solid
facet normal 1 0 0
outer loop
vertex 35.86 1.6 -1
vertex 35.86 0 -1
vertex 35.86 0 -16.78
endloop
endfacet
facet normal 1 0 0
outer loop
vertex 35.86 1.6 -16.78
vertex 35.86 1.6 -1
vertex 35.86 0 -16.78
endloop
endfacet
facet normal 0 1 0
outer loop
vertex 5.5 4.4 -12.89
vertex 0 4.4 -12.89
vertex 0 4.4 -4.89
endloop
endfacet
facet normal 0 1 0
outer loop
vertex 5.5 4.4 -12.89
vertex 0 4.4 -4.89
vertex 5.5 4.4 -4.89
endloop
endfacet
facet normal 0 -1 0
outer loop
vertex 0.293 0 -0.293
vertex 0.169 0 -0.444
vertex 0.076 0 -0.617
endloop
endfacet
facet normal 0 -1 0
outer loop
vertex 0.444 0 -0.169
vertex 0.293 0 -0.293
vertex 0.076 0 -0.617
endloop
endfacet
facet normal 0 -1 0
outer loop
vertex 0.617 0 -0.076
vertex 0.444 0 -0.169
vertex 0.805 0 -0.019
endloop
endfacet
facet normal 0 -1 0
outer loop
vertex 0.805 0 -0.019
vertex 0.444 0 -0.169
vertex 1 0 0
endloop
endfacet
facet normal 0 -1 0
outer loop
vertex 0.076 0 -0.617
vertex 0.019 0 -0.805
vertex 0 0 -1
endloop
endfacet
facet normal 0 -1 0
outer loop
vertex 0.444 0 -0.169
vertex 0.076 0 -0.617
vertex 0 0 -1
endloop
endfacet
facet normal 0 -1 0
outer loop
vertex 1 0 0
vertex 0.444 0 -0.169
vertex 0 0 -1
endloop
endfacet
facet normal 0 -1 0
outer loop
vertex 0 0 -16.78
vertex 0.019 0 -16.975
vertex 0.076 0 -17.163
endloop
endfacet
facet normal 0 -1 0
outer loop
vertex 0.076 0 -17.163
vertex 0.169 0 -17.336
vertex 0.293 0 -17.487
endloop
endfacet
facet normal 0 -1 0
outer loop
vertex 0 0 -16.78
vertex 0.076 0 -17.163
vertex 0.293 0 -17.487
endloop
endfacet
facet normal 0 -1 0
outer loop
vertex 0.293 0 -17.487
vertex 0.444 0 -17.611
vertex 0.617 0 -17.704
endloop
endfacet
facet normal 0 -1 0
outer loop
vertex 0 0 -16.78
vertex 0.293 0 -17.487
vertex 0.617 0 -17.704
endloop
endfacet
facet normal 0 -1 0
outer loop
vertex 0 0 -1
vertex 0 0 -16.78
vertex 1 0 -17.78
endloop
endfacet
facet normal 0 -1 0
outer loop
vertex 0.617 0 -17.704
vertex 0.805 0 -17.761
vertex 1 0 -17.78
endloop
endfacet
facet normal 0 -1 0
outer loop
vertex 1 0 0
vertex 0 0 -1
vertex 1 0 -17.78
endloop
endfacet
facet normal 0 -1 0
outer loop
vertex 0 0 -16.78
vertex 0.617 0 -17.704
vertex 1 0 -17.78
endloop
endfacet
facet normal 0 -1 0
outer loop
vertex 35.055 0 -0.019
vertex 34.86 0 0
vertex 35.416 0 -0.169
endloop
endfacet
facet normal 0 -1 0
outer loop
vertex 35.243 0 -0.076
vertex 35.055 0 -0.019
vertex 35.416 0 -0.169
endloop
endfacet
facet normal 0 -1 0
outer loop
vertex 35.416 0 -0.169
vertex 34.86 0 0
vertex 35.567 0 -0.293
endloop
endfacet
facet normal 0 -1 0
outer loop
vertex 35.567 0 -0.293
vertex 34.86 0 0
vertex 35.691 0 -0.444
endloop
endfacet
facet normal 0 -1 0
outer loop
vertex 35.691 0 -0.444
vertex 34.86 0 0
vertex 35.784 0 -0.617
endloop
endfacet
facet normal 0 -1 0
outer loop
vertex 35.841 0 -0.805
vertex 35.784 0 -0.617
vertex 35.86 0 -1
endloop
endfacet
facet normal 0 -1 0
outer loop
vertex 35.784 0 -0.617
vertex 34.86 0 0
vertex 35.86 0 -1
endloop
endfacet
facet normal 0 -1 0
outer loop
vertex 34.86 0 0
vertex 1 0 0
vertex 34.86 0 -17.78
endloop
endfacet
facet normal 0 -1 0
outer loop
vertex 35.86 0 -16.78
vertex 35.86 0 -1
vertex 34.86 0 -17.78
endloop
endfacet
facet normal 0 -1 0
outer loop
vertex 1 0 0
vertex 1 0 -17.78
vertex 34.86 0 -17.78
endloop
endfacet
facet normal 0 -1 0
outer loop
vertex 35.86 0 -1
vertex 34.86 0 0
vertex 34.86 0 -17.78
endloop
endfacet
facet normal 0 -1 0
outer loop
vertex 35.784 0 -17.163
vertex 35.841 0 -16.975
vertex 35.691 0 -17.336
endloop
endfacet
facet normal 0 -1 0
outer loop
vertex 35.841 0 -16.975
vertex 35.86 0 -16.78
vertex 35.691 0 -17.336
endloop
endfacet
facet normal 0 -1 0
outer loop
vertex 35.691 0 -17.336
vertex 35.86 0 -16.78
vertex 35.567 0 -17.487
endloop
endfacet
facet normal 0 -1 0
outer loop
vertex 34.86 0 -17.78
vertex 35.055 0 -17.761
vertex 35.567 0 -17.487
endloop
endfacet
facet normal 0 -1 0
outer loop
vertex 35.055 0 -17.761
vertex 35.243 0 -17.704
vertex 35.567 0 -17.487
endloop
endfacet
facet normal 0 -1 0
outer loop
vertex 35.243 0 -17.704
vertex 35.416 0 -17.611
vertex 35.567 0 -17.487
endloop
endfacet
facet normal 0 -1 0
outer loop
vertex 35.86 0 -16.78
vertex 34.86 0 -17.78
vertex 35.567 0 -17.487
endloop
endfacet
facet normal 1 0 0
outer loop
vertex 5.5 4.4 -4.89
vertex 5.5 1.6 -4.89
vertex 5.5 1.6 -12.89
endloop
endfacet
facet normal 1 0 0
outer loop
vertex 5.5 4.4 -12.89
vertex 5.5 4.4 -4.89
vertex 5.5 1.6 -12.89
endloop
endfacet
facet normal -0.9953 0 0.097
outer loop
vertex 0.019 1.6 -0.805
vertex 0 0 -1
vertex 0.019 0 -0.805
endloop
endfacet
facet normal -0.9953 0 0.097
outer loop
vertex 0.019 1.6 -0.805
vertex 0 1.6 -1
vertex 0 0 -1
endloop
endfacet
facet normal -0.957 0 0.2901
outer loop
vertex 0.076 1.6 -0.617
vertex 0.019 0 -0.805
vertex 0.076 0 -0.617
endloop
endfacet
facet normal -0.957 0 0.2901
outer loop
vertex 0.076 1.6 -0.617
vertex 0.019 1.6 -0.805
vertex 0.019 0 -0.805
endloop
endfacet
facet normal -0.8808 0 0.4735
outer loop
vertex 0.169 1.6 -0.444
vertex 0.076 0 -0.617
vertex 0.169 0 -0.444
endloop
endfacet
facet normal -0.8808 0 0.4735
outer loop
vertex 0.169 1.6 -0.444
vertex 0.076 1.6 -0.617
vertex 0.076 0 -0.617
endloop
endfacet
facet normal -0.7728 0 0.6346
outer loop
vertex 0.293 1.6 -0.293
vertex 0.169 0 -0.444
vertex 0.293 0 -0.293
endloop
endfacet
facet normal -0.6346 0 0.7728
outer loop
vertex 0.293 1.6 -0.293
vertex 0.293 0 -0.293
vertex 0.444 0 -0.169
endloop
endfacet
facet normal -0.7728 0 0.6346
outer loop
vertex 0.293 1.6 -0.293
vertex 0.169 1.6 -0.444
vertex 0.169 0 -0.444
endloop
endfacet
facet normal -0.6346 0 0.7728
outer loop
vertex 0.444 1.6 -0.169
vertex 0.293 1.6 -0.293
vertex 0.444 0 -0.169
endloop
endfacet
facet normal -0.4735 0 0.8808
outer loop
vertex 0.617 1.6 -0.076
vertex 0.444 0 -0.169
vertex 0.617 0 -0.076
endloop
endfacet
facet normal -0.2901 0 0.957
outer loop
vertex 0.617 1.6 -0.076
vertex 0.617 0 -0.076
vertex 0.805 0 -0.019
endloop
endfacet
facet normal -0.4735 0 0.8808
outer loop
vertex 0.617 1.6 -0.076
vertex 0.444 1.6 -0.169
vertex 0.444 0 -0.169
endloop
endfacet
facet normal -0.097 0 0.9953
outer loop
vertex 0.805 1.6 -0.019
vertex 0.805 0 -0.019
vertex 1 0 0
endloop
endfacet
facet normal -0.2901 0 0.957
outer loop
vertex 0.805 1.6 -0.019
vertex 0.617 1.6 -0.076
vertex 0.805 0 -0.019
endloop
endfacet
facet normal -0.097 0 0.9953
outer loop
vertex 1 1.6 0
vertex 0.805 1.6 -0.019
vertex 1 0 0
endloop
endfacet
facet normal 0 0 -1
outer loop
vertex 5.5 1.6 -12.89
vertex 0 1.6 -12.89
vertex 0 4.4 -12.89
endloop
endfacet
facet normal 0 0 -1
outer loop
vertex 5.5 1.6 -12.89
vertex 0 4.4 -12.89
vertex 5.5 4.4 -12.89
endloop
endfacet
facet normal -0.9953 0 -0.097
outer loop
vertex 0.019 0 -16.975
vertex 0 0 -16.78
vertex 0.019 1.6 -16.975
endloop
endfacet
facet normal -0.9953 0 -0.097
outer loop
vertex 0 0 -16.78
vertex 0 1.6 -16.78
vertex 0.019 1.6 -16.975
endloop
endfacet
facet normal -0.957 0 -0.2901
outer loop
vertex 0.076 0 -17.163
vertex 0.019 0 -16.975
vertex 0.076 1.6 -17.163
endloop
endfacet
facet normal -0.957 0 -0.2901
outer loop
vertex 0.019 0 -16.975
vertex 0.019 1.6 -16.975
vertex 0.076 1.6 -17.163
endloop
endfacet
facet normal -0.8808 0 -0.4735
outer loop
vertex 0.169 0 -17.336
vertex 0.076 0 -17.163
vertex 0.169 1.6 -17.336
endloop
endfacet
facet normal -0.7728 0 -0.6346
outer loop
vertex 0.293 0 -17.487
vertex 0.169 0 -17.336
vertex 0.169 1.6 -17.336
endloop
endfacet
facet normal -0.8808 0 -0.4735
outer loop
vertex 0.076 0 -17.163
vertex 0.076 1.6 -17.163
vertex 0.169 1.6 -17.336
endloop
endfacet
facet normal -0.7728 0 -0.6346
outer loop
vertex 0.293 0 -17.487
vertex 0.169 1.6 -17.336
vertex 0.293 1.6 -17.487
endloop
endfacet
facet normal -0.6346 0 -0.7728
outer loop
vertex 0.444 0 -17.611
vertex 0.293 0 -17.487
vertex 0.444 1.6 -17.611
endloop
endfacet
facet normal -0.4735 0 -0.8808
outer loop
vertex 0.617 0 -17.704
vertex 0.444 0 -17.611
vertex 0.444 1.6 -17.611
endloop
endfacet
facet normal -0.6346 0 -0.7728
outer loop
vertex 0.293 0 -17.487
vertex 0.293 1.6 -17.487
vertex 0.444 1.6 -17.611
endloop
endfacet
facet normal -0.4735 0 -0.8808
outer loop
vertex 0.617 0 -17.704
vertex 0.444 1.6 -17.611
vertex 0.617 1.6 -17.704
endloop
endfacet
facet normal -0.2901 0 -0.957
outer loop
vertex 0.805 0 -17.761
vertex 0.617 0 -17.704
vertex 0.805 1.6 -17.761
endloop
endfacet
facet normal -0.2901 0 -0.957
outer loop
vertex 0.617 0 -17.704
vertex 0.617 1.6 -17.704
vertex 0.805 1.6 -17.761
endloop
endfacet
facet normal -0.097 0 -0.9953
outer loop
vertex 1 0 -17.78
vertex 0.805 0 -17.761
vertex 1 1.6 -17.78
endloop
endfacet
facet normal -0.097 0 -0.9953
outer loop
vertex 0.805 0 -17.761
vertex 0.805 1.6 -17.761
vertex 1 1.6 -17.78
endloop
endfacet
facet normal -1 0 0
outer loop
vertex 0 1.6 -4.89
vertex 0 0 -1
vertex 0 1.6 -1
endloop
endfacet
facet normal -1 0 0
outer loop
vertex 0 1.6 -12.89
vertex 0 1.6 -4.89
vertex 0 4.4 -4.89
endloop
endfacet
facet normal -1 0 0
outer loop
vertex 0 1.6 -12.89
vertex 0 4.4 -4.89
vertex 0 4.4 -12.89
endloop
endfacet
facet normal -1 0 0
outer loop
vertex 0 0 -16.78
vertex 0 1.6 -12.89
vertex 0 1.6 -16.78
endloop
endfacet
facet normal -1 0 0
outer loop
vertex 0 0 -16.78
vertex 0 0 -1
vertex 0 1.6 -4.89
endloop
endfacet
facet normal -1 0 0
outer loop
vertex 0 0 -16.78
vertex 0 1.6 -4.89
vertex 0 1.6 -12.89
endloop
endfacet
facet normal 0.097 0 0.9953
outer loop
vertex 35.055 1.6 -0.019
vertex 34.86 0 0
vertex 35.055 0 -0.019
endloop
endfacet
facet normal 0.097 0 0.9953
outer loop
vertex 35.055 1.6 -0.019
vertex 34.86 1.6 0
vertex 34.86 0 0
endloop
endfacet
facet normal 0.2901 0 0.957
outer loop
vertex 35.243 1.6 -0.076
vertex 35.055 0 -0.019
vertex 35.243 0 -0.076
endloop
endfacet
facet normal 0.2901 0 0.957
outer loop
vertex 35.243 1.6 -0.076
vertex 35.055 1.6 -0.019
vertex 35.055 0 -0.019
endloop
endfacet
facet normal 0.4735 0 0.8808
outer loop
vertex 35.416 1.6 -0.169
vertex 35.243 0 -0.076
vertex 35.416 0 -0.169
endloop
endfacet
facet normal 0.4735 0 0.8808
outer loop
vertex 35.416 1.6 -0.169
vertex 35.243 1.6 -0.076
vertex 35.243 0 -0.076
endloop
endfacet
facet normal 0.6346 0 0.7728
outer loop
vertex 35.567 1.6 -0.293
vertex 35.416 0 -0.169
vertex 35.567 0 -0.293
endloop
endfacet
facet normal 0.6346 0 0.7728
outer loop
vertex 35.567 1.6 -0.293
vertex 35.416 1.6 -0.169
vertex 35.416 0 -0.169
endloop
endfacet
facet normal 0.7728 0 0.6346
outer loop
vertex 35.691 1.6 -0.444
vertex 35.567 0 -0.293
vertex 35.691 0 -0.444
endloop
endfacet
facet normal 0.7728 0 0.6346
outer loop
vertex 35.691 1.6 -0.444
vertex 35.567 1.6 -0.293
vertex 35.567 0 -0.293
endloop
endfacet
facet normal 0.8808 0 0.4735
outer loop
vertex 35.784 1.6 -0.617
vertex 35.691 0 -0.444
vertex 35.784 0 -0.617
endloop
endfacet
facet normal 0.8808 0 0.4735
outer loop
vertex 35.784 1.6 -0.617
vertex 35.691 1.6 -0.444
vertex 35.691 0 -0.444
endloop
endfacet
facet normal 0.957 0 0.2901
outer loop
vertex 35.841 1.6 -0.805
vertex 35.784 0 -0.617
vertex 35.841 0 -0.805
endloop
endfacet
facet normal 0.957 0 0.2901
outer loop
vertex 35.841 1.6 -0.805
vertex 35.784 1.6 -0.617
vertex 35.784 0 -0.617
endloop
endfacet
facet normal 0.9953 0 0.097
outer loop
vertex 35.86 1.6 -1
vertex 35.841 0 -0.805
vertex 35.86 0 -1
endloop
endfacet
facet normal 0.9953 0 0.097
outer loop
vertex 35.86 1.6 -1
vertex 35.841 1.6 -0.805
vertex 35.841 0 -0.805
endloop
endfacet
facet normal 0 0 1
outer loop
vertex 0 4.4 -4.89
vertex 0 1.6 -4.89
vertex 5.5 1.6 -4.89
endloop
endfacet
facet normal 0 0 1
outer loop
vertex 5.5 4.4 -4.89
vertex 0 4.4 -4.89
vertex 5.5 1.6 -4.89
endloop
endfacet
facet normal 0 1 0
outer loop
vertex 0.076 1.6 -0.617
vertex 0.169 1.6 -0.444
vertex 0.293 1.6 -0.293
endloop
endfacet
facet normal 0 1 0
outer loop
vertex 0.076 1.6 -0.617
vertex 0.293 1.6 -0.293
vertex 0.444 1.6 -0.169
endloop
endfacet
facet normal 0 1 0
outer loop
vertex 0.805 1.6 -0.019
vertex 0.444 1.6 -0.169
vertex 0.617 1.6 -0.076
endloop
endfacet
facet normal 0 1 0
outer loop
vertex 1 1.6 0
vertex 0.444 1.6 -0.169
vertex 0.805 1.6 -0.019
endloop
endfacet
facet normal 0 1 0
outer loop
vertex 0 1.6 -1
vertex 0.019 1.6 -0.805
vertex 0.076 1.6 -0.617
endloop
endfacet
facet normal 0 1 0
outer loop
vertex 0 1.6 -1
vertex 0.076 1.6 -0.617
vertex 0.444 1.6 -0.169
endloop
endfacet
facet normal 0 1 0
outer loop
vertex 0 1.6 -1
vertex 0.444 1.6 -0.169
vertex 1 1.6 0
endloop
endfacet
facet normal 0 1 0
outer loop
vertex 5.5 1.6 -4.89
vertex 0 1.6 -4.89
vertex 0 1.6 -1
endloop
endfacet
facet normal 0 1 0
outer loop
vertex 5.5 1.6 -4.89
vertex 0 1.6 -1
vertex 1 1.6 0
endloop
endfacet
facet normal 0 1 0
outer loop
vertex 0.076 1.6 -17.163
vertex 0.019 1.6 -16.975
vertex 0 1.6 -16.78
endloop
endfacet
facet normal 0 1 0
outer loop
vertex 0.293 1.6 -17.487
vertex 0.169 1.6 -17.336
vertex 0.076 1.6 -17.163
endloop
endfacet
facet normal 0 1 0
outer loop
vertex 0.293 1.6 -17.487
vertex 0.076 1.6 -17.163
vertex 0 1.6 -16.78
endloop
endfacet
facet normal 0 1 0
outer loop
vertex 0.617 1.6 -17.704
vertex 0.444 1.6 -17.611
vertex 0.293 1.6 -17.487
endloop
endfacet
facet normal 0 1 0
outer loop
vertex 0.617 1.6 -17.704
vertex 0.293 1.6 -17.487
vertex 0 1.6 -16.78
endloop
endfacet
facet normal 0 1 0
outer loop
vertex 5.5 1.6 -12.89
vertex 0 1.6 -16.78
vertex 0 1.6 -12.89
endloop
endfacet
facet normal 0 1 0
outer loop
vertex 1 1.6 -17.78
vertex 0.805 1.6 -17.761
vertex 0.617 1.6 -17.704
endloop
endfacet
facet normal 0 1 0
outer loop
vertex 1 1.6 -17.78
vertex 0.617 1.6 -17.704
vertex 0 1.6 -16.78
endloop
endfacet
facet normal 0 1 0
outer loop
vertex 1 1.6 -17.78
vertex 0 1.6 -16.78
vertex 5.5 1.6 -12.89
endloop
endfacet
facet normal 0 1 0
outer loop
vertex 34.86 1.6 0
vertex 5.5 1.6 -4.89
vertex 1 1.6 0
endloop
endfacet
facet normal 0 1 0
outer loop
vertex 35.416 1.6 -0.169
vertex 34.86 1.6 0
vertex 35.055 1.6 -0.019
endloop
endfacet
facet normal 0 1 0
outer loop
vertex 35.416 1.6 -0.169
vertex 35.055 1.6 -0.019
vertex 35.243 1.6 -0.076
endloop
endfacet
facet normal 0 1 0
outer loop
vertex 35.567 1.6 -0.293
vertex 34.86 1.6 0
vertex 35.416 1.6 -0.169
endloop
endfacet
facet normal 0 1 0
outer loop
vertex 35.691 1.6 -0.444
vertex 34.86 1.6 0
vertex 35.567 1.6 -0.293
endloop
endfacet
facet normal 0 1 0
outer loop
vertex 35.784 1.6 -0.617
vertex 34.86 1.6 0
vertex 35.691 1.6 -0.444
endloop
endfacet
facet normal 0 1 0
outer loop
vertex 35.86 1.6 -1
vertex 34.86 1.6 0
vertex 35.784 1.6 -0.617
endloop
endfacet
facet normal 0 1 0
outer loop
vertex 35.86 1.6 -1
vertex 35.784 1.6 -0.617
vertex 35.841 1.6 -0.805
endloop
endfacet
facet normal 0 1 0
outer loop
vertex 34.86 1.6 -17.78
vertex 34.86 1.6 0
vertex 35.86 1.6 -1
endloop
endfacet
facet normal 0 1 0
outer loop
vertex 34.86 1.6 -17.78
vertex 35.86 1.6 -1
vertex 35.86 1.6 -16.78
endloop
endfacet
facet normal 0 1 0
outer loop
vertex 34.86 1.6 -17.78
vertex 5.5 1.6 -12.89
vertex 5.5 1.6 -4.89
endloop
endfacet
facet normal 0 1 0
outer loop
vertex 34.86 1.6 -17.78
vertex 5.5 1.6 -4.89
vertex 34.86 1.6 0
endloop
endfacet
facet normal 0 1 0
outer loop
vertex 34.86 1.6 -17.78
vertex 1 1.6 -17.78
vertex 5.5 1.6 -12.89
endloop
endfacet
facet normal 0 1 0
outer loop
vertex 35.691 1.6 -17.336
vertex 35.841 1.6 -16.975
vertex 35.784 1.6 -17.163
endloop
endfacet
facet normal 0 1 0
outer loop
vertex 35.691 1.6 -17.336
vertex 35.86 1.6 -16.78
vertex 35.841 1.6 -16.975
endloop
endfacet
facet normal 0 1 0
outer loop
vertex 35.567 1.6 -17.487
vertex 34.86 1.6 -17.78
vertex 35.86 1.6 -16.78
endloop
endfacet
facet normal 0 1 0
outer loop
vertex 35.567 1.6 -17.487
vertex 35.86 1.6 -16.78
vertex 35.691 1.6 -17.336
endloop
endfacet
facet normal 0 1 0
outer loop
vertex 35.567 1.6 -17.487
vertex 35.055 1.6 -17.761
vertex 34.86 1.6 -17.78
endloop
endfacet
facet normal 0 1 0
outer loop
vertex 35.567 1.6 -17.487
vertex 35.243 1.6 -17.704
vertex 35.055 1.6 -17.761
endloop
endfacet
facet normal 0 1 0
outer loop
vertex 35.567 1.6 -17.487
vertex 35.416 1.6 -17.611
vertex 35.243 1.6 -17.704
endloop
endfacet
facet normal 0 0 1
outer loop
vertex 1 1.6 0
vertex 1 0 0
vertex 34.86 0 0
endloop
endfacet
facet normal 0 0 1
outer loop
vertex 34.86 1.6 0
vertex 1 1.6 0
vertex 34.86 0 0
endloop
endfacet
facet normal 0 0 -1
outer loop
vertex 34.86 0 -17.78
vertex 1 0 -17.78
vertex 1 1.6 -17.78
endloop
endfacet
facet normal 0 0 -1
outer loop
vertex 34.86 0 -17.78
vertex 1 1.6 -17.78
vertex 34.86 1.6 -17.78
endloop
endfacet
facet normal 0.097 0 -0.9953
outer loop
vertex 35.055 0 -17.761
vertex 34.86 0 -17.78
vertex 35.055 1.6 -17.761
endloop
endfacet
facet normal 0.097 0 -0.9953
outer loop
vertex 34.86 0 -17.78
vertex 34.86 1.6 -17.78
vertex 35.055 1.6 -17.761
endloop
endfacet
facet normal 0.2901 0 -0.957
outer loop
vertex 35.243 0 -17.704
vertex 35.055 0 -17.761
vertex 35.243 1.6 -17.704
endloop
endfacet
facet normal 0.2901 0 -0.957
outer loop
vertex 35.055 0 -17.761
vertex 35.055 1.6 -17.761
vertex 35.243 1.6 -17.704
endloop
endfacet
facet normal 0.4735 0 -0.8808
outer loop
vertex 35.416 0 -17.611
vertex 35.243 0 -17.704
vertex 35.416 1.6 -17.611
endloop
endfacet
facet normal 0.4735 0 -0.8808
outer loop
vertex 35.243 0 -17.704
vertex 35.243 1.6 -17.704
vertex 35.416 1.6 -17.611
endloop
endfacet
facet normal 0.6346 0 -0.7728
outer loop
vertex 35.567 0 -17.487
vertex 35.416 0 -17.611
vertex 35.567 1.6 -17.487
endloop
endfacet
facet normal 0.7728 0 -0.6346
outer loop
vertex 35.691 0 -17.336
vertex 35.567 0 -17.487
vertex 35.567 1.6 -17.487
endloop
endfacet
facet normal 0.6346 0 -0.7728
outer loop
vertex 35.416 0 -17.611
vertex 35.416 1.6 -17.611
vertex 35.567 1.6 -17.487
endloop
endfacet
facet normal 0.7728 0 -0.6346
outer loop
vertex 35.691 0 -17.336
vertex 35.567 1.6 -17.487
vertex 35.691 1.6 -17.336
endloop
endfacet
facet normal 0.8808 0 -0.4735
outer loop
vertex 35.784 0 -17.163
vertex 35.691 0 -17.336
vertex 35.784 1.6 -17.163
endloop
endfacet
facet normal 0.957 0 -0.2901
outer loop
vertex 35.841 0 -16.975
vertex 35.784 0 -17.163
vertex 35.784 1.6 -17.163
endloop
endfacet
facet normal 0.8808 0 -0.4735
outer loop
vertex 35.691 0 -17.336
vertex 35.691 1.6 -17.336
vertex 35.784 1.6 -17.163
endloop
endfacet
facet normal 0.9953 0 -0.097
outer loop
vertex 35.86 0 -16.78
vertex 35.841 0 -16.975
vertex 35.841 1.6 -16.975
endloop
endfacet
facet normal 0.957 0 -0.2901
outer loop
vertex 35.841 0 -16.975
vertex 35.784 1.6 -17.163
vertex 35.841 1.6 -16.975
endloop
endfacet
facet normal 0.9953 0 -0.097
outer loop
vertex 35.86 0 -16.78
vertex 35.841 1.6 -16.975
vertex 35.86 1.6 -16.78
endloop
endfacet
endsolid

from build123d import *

# Parameters (mm, degrees)
SKETCH1_W           = 35.86
SKETCH1_H           = 17.78
BOSS_EXTRUDE1_DEPTH = 1.6
SKETCH2_W           = 5.5
SKETCH2_H           = 8
BOSS_EXTRUDE2_DEPTH = 2.8
FILLET1_R           = 1


with BuildPart() as part:
    # Sketch1 → Boss-Extrude1 (new body)
    with BuildSketch(Plane(origin=(0, 0, 0), x_dir=(1, 0, 0), z_dir=(0, 1, 0))):
        with Locations((17.93, 8.89)):
            Rectangle(SKETCH1_W, SKETCH1_H)
    extrude(amount=BOSS_EXTRUDE1_DEPTH)

    # Sketch2 → Boss-Extrude2 (add)
    with BuildSketch(Plane(origin=(0, 1.6, 0), x_dir=(1, 0, 0), z_dir=(0, 1, 0))):
        with Locations((2.75, 8.89)):
            Rectangle(SKETCH2_W, SKETCH2_H)
    extrude(amount=BOSS_EXTRUDE2_DEPTH)

    # Fillet1
    fillet1_edges = [part.edges().sort_by_distance(p)[0] for p in [
        (0, 0.8, -17.78),
        (35.86, 0.8, -17.78),
        (35.86, 0.8, 0),
        (0, 0.8, 0),
    ]]
    fillet(fillet1_edges, radius=FILLET1_R)


solid = part.part
